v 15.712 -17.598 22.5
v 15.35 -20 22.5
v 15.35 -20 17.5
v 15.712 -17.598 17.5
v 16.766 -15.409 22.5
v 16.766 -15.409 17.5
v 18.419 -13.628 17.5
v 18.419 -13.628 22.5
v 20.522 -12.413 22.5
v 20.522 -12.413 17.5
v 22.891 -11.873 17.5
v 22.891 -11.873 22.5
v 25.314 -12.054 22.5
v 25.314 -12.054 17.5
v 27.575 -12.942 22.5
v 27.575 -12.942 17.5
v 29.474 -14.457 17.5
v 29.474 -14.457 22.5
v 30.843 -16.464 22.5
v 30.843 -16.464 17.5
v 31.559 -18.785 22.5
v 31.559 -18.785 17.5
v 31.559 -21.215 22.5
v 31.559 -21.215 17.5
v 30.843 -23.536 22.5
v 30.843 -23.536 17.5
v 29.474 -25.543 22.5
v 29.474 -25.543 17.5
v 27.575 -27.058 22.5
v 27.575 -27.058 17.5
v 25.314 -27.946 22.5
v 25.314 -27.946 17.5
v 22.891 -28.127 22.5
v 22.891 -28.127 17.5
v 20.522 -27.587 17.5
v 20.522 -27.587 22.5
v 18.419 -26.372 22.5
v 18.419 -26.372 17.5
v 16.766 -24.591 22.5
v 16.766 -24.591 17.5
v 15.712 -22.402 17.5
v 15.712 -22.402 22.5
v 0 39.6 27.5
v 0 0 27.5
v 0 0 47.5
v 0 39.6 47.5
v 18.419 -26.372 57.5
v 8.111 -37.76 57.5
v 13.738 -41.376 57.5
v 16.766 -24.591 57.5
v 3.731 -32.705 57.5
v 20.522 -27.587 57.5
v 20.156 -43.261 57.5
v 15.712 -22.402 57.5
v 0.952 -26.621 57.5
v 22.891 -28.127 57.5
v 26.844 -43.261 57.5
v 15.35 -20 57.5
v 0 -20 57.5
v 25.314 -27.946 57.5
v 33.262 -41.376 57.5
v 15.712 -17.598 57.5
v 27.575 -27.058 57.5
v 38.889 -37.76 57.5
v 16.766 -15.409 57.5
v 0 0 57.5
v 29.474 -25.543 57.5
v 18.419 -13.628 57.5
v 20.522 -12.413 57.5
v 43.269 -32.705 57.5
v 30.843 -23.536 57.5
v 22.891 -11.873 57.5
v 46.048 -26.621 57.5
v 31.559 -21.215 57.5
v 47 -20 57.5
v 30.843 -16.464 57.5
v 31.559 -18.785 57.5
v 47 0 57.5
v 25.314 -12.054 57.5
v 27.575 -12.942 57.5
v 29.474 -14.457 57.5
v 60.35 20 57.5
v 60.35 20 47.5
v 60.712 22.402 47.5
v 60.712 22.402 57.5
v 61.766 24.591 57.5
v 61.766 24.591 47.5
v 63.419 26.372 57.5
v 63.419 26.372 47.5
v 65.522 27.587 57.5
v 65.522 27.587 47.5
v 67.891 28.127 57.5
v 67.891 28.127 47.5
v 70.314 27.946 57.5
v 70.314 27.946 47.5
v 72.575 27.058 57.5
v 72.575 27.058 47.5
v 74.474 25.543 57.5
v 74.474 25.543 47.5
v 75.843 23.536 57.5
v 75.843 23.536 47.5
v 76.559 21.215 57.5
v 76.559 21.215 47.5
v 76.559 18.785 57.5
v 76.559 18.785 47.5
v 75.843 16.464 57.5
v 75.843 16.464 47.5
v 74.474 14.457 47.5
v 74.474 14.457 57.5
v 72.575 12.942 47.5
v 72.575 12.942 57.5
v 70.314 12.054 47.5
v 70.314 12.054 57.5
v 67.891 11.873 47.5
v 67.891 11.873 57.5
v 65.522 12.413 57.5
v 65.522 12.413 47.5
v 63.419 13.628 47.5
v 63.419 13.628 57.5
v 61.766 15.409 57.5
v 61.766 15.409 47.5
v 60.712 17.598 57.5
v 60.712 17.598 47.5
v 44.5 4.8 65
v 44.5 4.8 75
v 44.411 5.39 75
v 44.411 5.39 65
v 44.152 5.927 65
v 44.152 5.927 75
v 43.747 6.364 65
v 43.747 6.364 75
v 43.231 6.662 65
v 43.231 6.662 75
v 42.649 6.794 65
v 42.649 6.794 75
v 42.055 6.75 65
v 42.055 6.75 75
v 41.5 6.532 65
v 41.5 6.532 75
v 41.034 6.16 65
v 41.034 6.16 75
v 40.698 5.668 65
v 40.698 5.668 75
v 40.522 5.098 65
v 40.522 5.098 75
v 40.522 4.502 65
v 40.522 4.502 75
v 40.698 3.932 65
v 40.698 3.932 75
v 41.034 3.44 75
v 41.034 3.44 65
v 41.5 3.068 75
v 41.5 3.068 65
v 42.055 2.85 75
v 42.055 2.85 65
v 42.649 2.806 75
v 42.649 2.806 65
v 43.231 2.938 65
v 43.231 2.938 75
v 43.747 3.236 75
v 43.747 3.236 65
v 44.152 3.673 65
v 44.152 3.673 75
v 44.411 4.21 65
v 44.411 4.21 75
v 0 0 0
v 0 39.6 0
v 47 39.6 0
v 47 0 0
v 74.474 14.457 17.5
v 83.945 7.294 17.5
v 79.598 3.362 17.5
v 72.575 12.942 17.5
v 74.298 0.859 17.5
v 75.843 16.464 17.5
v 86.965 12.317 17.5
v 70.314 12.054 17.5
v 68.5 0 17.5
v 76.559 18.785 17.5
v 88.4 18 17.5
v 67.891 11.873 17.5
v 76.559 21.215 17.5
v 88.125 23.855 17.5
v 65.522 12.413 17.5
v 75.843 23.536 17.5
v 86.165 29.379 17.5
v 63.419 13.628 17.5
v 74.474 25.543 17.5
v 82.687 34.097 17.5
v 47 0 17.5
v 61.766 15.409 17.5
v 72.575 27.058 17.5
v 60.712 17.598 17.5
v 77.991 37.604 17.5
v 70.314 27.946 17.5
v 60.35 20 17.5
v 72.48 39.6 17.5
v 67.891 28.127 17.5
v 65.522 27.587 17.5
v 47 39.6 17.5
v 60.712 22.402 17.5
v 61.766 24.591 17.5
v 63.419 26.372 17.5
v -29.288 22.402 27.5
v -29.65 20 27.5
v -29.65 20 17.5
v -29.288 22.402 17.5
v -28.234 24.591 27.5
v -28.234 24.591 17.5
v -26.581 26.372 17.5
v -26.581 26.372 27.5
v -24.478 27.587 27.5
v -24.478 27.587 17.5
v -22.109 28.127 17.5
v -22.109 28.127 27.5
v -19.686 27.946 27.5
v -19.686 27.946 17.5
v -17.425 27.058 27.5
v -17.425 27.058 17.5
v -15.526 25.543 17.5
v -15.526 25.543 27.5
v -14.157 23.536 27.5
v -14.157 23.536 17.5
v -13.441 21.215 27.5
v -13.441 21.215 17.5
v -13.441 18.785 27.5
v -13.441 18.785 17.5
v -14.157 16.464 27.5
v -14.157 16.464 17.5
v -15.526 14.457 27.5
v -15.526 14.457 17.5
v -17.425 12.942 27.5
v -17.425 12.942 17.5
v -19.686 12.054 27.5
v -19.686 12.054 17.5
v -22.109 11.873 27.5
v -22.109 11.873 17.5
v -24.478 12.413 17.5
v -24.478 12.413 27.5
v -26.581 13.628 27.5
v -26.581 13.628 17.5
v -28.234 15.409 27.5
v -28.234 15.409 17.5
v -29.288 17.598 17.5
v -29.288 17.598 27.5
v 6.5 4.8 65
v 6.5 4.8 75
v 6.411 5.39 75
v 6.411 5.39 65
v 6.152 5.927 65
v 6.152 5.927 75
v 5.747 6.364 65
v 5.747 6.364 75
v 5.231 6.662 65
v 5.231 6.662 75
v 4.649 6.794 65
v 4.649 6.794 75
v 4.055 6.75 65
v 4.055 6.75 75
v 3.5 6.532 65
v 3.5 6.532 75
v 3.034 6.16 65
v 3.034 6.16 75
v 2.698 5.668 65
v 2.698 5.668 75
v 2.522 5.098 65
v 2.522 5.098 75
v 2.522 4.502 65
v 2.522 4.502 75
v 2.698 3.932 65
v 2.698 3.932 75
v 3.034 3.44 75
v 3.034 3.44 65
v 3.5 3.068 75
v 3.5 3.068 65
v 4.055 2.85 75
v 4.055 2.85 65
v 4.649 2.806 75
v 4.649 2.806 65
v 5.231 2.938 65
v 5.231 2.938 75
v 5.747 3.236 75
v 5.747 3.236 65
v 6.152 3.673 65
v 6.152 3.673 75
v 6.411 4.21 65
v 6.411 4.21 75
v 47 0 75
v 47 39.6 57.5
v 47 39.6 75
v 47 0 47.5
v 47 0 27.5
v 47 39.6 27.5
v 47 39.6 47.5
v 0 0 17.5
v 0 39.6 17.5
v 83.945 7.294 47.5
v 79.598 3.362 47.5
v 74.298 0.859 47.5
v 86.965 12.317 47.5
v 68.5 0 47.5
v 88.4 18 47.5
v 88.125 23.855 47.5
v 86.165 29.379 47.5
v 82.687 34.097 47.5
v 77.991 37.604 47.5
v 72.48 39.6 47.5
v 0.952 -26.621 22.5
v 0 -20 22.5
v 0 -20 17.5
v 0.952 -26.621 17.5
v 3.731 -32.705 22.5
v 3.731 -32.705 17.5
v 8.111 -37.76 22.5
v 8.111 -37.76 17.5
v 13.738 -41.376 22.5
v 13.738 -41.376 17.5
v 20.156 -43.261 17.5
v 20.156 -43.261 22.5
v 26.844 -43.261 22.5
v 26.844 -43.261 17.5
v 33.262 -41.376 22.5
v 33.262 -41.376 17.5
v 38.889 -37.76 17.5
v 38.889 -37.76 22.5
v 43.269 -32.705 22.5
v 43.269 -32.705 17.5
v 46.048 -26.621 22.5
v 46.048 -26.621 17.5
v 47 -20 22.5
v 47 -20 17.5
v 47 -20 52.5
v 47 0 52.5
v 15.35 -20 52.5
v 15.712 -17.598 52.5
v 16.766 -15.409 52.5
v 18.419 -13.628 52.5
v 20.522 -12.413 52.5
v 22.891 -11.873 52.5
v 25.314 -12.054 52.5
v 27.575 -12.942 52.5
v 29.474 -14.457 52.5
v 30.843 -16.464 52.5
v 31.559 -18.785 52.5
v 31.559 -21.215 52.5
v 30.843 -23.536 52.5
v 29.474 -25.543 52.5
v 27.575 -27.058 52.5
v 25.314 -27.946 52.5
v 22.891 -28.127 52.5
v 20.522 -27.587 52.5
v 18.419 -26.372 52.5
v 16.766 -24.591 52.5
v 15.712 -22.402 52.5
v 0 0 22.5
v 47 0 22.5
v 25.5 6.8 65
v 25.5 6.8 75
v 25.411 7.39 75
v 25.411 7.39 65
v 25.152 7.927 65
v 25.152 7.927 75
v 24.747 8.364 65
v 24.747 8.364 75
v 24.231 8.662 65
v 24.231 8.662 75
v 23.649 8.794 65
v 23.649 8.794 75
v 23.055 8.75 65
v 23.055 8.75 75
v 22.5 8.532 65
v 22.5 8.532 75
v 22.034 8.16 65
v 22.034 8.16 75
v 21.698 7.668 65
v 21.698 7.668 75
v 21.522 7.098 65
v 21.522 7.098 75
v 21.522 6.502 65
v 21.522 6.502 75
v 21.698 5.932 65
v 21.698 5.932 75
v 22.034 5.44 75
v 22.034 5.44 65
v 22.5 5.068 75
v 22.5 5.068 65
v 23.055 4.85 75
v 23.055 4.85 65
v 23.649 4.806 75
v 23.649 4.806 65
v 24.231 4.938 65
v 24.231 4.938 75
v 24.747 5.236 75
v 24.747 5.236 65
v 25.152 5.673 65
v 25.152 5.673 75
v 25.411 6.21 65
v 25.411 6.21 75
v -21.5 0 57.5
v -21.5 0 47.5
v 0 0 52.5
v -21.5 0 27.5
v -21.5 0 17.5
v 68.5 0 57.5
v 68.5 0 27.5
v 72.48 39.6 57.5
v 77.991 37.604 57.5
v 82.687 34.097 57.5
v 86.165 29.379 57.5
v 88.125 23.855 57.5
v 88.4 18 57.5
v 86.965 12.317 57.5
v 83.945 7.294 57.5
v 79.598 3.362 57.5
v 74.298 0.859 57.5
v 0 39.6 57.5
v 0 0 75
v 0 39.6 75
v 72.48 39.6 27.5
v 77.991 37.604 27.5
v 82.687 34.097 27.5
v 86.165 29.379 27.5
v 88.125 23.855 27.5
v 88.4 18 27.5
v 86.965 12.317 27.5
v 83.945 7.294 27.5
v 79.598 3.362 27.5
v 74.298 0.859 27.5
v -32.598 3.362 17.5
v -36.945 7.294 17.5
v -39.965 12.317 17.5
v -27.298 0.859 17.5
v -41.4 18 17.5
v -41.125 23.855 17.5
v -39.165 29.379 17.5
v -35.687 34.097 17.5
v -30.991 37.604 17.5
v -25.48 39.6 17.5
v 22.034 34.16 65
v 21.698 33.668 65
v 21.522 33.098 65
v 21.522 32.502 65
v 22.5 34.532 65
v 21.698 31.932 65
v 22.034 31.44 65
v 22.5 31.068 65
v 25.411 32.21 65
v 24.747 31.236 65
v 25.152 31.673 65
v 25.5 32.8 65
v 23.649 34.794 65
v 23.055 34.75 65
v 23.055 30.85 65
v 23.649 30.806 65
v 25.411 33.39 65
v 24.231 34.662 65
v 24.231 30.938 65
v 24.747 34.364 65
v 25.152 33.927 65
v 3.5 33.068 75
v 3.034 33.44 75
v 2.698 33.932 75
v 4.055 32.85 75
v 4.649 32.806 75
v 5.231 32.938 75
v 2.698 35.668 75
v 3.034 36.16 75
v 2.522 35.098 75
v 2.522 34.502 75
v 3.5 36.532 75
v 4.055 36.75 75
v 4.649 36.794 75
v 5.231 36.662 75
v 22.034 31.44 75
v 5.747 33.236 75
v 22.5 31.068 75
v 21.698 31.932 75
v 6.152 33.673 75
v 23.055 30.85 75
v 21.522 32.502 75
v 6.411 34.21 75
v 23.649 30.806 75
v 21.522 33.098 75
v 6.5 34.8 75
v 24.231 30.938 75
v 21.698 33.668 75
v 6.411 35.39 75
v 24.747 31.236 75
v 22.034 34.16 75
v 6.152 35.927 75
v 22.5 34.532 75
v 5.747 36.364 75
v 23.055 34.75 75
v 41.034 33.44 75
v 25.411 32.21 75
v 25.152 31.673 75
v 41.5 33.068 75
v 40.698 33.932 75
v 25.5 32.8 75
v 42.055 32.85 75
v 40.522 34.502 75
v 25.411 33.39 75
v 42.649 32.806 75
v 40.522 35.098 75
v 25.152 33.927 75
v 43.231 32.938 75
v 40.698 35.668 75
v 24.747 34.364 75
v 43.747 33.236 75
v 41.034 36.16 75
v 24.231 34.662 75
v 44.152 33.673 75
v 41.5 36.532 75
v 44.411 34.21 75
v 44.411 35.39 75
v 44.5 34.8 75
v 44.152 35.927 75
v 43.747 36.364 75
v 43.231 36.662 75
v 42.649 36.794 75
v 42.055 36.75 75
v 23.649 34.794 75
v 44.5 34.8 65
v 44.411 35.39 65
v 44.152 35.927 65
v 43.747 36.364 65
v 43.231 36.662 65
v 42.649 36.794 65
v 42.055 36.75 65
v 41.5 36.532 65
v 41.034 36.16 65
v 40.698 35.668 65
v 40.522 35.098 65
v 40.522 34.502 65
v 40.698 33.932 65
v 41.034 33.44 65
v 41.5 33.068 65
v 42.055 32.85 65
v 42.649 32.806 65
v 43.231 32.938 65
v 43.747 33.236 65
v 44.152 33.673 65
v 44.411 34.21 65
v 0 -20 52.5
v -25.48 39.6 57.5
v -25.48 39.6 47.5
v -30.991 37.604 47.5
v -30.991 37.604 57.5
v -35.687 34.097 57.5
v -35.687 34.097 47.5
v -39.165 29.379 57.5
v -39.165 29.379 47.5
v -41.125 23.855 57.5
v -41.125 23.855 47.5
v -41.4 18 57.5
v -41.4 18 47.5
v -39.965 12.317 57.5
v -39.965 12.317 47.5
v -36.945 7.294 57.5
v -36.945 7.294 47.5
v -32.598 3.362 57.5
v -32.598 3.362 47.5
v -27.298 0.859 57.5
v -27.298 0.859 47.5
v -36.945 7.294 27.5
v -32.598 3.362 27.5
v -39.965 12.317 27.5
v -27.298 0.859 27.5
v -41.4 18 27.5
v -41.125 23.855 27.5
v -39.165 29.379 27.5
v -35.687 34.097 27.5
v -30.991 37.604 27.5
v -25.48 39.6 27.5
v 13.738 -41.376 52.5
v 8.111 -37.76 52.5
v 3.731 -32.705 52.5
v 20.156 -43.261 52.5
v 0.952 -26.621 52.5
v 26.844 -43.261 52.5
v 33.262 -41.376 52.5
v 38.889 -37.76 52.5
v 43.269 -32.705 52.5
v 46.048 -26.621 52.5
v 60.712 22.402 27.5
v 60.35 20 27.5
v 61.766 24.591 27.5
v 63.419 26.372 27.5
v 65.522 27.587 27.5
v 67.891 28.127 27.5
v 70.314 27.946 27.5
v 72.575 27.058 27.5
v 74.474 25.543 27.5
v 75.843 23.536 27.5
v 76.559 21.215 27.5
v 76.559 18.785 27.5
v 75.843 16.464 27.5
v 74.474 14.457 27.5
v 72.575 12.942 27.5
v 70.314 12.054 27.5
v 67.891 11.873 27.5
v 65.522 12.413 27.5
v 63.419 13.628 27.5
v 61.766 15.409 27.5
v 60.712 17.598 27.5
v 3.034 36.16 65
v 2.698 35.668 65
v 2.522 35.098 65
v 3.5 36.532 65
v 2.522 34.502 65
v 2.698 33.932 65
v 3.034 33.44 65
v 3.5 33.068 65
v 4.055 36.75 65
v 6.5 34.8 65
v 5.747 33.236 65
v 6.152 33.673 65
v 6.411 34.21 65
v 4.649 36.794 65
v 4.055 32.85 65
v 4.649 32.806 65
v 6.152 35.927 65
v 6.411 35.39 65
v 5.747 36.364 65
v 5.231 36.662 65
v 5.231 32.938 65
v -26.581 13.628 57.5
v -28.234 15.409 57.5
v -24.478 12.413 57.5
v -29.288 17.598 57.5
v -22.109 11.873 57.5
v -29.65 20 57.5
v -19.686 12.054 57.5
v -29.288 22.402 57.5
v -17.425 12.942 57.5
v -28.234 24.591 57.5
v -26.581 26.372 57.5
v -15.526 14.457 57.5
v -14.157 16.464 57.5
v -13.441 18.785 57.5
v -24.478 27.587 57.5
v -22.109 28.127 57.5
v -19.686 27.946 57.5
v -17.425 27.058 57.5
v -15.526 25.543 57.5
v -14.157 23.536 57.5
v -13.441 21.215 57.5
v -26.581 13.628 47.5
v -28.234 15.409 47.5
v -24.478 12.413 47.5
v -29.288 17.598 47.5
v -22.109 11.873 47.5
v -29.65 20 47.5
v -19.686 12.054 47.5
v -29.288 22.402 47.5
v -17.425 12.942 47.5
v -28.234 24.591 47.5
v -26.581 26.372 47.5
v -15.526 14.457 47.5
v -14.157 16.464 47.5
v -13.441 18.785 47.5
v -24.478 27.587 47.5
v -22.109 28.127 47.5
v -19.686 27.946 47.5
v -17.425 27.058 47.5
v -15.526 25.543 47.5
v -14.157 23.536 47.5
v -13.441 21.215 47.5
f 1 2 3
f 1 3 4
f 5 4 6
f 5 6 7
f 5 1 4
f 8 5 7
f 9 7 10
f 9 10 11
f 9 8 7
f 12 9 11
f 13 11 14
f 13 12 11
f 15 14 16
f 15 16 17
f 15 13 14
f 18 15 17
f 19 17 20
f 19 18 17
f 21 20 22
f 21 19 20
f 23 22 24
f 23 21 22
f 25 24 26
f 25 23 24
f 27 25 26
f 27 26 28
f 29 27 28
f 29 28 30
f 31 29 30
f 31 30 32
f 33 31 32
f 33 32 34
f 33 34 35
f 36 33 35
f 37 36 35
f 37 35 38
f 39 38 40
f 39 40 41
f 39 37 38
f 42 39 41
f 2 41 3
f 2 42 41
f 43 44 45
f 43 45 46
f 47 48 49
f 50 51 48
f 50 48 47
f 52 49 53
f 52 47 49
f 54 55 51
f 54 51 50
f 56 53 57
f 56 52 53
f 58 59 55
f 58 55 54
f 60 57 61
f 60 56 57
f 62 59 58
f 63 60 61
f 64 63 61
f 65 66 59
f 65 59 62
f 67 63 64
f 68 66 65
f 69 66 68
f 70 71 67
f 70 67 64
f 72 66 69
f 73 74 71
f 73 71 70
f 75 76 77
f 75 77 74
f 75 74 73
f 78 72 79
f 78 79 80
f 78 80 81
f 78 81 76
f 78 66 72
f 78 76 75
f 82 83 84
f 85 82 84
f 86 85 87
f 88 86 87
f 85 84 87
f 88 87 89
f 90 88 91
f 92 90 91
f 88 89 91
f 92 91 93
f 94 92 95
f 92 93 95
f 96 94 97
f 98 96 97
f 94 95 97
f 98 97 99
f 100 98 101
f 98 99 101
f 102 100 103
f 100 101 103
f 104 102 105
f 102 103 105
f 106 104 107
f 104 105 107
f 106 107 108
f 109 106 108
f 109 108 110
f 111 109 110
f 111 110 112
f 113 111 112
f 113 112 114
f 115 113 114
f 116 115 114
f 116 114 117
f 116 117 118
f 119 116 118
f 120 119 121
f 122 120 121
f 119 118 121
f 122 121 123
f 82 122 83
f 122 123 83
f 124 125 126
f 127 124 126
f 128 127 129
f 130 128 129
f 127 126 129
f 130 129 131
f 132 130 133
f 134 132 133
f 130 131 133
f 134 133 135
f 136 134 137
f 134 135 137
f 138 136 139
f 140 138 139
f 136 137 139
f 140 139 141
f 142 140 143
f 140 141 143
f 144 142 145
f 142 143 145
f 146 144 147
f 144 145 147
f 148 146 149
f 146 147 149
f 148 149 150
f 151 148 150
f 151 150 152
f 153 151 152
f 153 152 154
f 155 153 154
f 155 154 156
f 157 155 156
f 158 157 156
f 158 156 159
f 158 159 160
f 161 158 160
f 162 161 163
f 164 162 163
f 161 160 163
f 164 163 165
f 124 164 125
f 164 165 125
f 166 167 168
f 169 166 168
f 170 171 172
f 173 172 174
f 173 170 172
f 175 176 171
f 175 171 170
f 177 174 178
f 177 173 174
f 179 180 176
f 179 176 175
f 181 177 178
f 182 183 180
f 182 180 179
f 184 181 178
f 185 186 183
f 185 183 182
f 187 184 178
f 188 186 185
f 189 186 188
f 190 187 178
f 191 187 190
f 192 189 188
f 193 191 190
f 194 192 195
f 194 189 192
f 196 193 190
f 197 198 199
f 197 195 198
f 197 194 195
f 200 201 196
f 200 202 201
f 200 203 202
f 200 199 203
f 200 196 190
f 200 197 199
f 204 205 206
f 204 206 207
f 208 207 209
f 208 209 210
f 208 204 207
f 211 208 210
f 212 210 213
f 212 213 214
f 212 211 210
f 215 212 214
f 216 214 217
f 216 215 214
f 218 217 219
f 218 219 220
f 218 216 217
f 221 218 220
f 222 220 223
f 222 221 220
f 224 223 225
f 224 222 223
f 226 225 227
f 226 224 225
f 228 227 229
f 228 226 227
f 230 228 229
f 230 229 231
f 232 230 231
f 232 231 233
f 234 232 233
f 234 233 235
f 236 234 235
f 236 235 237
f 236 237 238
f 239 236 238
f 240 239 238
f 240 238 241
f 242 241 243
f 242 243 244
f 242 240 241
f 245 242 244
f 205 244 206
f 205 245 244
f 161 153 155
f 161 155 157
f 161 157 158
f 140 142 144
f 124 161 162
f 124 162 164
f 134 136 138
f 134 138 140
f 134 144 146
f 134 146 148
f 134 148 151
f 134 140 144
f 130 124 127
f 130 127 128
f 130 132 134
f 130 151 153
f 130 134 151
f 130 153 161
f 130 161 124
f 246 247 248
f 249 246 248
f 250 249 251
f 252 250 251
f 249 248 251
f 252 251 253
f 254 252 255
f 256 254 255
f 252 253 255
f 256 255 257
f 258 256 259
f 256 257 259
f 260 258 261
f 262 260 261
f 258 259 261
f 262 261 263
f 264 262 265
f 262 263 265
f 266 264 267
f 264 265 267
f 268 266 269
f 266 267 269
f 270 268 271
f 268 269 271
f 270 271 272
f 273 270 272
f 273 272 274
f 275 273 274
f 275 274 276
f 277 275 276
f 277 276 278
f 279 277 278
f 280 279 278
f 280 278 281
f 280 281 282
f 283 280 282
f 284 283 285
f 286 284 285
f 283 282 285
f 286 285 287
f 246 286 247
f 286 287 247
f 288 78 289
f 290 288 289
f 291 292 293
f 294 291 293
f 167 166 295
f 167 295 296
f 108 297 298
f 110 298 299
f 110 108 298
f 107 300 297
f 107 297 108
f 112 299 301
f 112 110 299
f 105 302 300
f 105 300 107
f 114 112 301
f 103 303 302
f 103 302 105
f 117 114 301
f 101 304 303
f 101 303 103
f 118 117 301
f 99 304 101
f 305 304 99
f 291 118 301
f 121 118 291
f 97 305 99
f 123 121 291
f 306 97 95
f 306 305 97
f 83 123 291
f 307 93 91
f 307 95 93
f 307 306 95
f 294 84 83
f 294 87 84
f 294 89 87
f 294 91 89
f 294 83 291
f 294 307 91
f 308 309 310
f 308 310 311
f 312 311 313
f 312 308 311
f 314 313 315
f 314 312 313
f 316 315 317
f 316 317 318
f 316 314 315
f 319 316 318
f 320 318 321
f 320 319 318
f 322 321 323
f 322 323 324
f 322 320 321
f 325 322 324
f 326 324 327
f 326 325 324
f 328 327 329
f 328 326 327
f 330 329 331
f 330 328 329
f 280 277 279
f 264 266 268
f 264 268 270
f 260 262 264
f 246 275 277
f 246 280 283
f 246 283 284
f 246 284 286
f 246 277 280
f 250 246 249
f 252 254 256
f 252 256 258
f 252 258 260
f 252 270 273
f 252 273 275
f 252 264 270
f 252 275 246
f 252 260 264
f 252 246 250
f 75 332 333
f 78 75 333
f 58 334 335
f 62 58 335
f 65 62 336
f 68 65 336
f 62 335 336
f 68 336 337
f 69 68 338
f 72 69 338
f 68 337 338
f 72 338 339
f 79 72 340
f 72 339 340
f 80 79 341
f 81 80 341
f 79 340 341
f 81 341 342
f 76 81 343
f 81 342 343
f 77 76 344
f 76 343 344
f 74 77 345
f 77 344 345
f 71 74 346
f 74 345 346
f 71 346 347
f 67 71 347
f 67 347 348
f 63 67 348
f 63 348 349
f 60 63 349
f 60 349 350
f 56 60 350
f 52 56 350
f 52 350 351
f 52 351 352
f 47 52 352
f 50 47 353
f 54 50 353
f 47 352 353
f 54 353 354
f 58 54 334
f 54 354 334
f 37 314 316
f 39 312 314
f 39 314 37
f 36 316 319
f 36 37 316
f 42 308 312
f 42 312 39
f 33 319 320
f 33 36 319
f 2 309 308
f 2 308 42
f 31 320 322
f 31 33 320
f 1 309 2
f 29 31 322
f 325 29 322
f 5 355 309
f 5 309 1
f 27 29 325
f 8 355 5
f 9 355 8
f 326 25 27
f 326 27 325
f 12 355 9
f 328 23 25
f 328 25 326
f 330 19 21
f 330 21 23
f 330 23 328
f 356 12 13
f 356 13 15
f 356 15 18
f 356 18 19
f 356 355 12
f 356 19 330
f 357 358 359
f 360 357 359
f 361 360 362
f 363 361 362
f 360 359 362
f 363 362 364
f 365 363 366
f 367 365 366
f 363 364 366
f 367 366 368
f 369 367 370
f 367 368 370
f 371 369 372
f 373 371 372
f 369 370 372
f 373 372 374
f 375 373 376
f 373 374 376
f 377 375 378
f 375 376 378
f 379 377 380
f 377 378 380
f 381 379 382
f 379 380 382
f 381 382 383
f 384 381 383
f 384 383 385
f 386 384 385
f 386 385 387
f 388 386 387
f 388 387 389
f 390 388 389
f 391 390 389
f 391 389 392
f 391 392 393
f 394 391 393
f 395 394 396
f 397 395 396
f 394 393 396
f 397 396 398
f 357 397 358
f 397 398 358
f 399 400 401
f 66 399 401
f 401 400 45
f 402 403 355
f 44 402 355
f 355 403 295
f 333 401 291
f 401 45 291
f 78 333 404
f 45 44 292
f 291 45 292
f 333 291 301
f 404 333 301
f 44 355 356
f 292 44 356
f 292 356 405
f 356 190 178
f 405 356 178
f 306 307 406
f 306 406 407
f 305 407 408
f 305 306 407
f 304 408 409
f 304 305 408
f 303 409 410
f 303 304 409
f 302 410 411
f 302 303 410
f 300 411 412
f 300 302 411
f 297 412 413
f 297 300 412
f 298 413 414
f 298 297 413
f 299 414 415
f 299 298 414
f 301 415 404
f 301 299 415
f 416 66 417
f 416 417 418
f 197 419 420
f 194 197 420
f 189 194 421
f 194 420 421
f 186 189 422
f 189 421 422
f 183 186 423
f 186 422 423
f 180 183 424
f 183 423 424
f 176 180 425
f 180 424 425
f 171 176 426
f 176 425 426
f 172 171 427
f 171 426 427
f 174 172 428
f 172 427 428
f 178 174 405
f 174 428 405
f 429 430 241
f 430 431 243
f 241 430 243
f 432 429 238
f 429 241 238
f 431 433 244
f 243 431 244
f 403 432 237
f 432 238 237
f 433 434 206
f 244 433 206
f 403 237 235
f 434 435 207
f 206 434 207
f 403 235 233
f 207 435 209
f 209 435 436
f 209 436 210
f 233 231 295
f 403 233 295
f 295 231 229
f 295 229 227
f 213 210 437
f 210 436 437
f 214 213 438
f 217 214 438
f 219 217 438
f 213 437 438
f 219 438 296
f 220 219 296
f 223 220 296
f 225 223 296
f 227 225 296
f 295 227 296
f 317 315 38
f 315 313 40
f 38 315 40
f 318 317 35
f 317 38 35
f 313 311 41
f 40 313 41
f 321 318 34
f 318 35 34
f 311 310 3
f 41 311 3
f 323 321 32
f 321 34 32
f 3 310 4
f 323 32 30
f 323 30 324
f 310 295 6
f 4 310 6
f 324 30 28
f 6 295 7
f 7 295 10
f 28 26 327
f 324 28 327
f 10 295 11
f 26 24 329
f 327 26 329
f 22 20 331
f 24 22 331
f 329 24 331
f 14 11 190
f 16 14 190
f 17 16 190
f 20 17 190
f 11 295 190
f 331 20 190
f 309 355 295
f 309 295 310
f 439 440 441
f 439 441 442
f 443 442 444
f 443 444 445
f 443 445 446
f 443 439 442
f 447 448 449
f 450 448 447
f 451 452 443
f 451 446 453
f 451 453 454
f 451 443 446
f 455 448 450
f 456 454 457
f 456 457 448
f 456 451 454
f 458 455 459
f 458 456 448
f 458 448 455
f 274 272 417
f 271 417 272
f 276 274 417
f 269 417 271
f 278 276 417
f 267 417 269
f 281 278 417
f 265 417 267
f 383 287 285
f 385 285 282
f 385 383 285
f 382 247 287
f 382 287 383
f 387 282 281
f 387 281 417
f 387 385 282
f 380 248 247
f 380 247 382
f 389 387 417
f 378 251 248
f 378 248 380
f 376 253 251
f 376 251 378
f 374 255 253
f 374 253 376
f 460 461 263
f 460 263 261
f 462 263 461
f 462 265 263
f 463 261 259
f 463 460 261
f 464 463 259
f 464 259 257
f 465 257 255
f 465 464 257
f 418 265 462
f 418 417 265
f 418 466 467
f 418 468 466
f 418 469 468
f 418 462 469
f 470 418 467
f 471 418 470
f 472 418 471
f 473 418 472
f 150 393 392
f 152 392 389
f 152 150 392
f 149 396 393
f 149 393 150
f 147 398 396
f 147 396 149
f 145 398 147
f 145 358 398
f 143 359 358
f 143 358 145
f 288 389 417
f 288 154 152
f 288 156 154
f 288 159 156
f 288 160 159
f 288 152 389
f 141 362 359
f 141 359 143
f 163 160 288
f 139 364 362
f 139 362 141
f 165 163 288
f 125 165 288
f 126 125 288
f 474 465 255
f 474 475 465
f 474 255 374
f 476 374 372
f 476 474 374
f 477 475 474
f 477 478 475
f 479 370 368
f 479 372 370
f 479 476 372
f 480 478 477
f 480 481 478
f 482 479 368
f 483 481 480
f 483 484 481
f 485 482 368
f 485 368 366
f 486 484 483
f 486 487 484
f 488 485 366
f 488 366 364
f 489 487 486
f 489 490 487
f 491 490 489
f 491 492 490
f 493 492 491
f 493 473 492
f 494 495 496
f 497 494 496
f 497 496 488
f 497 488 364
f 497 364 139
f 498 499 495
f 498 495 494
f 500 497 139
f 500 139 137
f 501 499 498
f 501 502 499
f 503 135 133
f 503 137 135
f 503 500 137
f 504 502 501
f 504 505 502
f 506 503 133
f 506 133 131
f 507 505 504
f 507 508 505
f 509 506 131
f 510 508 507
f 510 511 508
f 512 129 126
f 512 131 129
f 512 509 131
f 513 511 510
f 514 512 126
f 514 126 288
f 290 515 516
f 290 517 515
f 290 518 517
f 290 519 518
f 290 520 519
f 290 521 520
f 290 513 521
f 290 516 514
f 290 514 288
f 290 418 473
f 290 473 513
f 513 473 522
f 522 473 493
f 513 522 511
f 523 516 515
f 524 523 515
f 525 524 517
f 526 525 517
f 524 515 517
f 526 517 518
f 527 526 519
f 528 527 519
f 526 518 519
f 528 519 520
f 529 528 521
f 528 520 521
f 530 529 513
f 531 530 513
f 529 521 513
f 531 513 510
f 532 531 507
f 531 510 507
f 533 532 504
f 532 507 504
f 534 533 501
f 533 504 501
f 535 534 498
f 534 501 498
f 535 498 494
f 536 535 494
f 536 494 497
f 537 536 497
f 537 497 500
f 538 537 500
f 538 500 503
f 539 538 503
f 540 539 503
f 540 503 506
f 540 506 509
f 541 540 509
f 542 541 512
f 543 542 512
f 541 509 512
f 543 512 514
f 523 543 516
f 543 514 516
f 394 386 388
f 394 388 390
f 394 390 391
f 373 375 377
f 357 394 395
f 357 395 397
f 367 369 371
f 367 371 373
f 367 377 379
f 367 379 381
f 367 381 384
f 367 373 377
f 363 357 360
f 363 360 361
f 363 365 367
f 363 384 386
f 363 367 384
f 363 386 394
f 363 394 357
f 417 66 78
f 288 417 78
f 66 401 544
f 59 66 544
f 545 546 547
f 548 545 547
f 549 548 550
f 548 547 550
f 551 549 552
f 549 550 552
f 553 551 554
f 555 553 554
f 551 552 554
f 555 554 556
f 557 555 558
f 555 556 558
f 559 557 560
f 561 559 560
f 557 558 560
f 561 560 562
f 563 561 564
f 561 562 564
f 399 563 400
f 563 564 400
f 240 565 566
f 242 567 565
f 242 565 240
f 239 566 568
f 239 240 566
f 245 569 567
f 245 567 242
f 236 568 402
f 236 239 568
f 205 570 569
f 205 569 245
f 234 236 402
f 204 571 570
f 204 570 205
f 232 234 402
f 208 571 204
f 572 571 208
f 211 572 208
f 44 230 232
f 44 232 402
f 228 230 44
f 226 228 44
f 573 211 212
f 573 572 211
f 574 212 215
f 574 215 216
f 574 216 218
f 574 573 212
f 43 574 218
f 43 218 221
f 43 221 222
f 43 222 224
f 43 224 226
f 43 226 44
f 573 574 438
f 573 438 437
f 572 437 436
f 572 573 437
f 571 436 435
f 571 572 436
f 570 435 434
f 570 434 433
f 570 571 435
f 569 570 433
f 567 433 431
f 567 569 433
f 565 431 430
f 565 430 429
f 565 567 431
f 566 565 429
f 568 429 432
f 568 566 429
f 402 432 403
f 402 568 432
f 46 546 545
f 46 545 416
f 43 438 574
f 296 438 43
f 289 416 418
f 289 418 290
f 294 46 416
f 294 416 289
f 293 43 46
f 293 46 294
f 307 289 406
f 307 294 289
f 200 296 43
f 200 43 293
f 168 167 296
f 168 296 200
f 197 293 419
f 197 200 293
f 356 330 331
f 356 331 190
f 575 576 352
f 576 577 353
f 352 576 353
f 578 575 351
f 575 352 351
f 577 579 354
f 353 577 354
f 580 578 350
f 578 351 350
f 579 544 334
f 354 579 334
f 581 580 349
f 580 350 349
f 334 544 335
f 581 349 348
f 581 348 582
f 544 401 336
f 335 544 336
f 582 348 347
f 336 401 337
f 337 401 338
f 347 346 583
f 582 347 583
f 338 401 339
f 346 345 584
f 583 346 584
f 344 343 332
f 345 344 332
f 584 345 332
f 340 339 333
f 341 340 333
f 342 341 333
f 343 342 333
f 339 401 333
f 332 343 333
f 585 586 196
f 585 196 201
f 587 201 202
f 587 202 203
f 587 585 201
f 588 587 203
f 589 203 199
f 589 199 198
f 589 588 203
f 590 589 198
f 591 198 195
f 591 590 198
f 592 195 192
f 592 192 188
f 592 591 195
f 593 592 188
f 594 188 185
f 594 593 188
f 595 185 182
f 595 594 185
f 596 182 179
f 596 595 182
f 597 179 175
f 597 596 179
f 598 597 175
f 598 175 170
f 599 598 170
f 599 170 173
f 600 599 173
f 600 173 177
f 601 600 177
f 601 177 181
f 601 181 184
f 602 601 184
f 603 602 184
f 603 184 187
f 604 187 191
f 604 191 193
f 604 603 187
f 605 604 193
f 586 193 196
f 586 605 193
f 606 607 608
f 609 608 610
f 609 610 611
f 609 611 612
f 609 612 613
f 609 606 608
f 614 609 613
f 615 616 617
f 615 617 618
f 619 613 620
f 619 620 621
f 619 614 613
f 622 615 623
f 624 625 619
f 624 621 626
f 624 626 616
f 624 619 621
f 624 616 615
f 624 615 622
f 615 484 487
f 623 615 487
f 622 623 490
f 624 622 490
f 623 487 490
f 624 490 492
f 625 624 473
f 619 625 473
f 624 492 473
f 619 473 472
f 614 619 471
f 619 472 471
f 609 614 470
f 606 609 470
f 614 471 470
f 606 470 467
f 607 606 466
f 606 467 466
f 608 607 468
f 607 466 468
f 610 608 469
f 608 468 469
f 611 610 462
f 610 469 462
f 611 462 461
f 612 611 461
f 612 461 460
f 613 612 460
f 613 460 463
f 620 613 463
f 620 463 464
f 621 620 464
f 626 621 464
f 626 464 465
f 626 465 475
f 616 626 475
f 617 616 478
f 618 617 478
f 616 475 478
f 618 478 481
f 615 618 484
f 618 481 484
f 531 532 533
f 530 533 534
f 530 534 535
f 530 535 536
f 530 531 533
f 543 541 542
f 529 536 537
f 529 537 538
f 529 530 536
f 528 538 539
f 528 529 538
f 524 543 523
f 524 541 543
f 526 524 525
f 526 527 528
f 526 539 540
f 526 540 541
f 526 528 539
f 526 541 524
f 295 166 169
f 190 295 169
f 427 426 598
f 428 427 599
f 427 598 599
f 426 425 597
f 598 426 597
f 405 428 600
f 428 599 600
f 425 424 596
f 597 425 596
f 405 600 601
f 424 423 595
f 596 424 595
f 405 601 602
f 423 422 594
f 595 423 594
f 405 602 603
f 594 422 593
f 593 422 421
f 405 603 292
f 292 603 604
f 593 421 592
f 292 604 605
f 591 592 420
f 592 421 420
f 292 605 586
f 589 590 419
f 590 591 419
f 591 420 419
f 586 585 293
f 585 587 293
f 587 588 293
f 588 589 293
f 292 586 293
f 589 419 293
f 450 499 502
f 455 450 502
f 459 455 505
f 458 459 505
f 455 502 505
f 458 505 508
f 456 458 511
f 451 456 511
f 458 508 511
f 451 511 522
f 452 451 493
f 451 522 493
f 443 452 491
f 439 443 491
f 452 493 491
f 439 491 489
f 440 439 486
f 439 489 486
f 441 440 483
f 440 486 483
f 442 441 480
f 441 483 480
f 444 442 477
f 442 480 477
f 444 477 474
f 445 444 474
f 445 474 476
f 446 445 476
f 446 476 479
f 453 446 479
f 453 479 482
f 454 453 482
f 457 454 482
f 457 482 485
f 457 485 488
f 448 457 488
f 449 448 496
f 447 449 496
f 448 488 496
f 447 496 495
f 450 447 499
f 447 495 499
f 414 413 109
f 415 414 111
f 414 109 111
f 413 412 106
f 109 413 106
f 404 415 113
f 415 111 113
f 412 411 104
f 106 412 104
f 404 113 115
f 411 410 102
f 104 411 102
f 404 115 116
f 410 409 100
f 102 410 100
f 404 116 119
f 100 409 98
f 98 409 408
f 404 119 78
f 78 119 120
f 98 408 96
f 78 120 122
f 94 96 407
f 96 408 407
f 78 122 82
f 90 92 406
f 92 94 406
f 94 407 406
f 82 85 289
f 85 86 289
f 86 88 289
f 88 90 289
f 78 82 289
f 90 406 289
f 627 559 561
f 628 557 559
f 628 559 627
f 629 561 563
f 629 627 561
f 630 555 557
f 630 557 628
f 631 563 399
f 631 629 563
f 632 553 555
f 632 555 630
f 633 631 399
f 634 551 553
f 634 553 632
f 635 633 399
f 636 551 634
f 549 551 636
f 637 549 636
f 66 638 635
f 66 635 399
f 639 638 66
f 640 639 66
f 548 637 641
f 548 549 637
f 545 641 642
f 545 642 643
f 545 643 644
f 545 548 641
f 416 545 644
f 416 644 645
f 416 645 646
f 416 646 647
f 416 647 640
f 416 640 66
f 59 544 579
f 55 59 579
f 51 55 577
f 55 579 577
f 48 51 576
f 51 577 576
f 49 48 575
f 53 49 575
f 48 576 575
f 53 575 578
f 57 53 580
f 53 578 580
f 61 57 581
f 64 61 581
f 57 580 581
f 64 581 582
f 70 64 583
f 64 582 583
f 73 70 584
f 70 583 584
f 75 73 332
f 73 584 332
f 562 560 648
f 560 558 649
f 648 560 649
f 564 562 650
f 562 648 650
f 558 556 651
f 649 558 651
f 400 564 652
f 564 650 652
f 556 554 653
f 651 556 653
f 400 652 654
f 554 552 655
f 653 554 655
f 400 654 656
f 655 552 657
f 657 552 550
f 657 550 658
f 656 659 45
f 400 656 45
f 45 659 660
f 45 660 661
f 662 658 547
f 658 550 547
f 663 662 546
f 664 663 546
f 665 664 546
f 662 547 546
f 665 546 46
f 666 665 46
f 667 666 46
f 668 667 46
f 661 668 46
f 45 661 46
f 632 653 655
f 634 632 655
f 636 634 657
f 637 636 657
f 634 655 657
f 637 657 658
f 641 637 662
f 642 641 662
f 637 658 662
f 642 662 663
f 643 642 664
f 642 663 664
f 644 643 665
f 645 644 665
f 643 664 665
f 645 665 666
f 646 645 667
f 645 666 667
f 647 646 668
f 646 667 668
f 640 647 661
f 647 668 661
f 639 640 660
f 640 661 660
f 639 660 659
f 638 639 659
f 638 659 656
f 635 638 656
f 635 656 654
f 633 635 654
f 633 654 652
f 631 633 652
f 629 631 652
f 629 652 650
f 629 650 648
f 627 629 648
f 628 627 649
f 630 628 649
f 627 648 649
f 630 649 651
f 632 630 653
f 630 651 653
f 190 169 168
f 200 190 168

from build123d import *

# Parameters (mm, degrees)
SZKIC1_W                    = 47
SZKIC1_H                    = 39.6
DODANIE_WYCI_GNI_CIE3_DEPTH = 75
SZKIC4_R                    = 8.15
DODANIE_WYCI_GNI_CIE4_DEPTH = 10
SZKIC5_R                    = 8.15
DODANIE_WYCI_GNI_CIE5_DEPTH = 5
SZKIC6_R                    = 2
WYTNIJ_WYCI_GNI_CIE1_DEPTH  = 10


with BuildPart() as part:
    # Szkic1 → Dodanie-wyciągnięcie3 (new body)
    with BuildSketch(Plane.XY):
        with Locations((23.5, 19.8)):
            Rectangle(SZKIC1_W, SZKIC1_H)
    extrude(amount=DODANIE_WYCI_GNI_CIE3_DEPTH)

    # Szkic4 → Dodanie-wyciągnięcie4 (add)
    with BuildSketch(Plane(origin=(0, 0, 27.5), x_dir=(-1, 0, 0), z_dir=(0, 0, -1))):
        with BuildLine():
            Line((-47, 39.6), (-72.479949748, 39.6))
            ThreePointArc((-72.479949748, 39.6), (-88.399748742, 18), (-68.5, 0))
            Line((-68.5, 0), (-47, 0))
            Line((-47, 0), (-47, 39.6))
        make_face()
        with Locations((-68.5, 20)):
            Circle(SZKIC4_R, mode=Mode.SUBTRACT)
        with BuildLine():
            Line((21.5, 0), (0, 0))
            Line((0, 0), (0, 39.6))
            Line((0, 39.6), (25.479949748, 39.6))
            ThreePointArc((25.479949748, 39.6), (41.399748742, 18), (21.5, 0))
        make_face()
        with Locations((21.5, 20)):
            Circle(SZKIC4_R, mode=Mode.SUBTRACT)
    dodanie_wyci_gni_cie4 = extrude(amount=DODANIE_WYCI_GNI_CIE4_DEPTH)

    # Lustro1: Dodanie-wyciągnięcie4 across plane
    add(dodanie_wyci_gni_cie4.mirror(Plane(origin=(0, 0, 37.5), x_dir=(1, 0, 0), z_dir=(0, 0, -1))))

    # Szkic5 → Dodanie-wyciągnięcie5 (add)
    with BuildSketch(Plane(origin=(0, 0, 22.5), x_dir=(-1, 0, 0), z_dir=(0, 0, -1))):
        with BuildLine():
            Line((-47, 0), (0, 0))
            Line((0, 0), (0, -20))
            ThreePointArc((0, -20), (-23.5, -43.5), (-47, -20))
            Line((-47, -20), (-47, 0))
        make_face()
        with Locations((-23.5, -20)):
            Circle(SZKIC5_R, mode=Mode.SUBTRACT)
    dodanie_wyci_gni_cie5 = extrude(amount=DODANIE_WYCI_GNI_CIE5_DEPTH)

    # Lustro2: Dodanie-wyciągnięcie5 across plane
    add(dodanie_wyci_gni_cie5.mirror(Plane(origin=(0, 0, 37.5), x_dir=(1, 0, 0), z_dir=(0, 0, -1))))

    # Szkic6 → Wytnij-wyciągnięcie1 (cut)
    with BuildSketch(Plane.XY.offset(75)):
        with Locations((4.5, 4.8)):
            Circle(SZKIC6_R)
        with Locations((4.5, 34.8)):
            Circle(SZKIC6_R)
        with Locations((42.5, 34.8)):
            Circle(SZKIC6_R)
        with Locations((42.5, 4.8)):
            Circle(SZKIC6_R)
        with Locations((23.5, 32.8)):
            Circle(SZKIC6_R)
        with Locations((23.5, 6.8)):
            Circle(SZKIC6_R)
    extrude(amount=-WYTNIJ_WYCI_GNI_CIE1_DEPTH, mode=Mode.SUBTRACT)


solid = part.part
